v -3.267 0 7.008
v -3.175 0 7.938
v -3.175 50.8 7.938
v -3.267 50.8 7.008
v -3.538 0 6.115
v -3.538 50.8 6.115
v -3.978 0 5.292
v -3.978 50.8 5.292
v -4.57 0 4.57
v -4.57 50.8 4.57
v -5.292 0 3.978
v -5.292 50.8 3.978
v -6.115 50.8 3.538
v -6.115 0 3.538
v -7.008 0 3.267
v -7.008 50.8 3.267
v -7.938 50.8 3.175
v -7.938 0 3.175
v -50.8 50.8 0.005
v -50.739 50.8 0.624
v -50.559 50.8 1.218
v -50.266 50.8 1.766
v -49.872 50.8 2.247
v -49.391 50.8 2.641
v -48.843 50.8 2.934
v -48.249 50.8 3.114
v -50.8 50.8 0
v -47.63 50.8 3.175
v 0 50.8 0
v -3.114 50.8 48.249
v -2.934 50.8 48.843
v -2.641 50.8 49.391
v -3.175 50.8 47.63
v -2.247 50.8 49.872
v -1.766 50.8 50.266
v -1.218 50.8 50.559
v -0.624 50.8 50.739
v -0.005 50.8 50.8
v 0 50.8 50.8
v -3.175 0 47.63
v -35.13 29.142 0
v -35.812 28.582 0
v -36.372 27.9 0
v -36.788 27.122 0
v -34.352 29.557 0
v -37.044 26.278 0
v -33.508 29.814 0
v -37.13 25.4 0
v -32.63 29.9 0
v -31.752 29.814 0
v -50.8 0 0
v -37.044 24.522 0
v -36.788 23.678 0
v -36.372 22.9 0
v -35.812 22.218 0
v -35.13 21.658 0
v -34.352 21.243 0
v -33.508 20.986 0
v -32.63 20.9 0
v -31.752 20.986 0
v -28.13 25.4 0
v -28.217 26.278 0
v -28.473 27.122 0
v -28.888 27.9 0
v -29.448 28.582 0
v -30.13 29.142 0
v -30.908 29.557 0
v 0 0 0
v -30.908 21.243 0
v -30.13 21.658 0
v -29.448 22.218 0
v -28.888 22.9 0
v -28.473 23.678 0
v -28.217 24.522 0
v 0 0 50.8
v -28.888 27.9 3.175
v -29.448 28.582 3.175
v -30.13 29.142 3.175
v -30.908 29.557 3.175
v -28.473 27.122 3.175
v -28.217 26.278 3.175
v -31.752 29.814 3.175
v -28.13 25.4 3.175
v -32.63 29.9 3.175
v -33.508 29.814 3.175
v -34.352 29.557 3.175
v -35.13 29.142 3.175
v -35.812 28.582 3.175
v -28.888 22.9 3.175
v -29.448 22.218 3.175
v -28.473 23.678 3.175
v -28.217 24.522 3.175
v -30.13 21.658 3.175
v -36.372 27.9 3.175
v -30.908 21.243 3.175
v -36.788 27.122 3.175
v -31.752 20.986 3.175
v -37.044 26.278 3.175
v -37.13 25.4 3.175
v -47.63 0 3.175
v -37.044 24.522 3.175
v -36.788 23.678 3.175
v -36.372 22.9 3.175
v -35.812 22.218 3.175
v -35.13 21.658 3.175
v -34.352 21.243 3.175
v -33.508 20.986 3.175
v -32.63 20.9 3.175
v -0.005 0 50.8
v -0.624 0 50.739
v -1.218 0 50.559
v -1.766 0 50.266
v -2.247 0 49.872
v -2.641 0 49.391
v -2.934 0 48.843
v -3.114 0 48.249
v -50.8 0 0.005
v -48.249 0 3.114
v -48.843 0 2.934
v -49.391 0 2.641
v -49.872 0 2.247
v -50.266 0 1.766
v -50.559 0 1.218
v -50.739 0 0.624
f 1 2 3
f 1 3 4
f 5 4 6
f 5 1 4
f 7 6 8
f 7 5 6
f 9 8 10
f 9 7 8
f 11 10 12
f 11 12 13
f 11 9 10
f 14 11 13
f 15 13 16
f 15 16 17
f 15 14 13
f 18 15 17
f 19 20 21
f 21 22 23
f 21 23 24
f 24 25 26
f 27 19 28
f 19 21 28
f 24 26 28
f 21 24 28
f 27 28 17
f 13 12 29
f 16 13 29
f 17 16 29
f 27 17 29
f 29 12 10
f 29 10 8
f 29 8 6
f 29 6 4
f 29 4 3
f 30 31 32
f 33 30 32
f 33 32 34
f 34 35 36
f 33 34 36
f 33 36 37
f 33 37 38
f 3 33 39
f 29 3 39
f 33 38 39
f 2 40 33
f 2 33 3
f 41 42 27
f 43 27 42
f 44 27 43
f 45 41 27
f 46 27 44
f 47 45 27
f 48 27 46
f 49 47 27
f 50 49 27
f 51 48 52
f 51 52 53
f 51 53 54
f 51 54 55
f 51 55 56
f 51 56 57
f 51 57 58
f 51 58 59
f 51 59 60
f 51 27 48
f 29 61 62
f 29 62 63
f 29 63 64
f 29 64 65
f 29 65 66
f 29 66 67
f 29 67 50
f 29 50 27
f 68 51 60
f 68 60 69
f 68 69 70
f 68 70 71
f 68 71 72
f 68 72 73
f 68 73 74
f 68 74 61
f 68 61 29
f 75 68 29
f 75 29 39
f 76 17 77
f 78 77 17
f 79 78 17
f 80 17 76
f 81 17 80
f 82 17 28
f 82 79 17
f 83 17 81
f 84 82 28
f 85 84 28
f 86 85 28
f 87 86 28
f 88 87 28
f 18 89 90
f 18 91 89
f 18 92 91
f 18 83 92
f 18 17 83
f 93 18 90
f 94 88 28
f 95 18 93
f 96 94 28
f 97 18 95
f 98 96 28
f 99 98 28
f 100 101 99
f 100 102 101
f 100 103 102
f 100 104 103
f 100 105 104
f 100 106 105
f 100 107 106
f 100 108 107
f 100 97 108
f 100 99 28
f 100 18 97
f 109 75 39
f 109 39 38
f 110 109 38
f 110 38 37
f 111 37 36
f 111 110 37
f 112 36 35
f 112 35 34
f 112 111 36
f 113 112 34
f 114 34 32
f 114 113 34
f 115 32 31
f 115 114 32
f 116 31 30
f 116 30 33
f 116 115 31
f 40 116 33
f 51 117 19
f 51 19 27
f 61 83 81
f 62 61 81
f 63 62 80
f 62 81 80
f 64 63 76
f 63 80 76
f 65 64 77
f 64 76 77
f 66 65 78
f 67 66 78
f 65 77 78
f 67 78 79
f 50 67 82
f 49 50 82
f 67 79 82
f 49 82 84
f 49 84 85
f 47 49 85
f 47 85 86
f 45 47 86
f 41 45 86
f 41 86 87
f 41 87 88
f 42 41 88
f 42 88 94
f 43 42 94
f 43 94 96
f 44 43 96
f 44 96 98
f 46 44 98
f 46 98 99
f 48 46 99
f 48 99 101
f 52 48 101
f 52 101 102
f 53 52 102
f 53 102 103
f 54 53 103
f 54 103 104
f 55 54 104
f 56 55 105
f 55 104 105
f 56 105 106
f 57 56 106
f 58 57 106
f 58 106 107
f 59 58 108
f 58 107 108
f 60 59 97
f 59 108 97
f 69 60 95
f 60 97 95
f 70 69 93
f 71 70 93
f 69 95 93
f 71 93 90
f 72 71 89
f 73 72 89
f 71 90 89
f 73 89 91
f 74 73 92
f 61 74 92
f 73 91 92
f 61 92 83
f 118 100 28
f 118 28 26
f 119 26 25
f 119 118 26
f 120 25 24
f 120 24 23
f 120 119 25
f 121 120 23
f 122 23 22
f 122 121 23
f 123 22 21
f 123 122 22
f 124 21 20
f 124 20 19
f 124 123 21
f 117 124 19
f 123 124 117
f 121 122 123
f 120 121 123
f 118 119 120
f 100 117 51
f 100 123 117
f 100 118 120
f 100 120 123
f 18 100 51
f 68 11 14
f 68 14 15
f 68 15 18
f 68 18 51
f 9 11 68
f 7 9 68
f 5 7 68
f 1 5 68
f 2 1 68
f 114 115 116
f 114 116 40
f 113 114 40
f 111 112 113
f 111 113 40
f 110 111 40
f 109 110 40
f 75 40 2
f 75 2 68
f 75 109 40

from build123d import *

# Parameters (mm, degrees)
HIERRO_ANGULAR_2_X_2_X_0_125_1_DEPTH = 50.8
CROQUIS3_R                           = 4.5
CORTAR_EXTRUIR1_DEPTH                = 10


with BuildPart() as part:
    # Sketch1 → Hierro angular 2 X 2 X 0.125(1) (new body)
    with BuildSketch(Plane(origin=(0, 0, 0), x_dir=(-1, 0, 0), z_dir=(0, 1, 0))):
        with BuildLine():
            Line((0, 0), (0, 50.8))
            Line((0, 50.8), (0.00508, 50.8))
            ThreePointArc((0.00508, 50.8), (2.246551928, 49.871551928), (3.175, 47.63008))
            Line((3.175, 47.63008), (3.175, 7.9375))
            ThreePointArc((3.175, 7.9375), (4.569903955, 4.569903955), (7.9375, 3.175))
            Line((7.9375, 3.175), (47.63008, 3.175))
            ThreePointArc((47.63008, 3.175), (49.871551928, 2.246551928), (50.8, 0.00508))
            Line((50.8, 0.00508), (50.8, 0))
            Line((50.8, 0), (0, 0))
        make_face()
    extrude(amount=HIERRO_ANGULAR_2_X_2_X_0_125_1_DEPTH)

    # Croquis3 → Cortar-Extruir1 (cut)
    with BuildSketch(Plane.XY.offset(3.175)):
        with Locations((-32.63008, 25.4)):
            Circle(CROQUIS3_R)
    extrude(amount=-CORTAR_EXTRUIR1_DEPTH, mode=Mode.SUBTRACT)


solid = part.part
